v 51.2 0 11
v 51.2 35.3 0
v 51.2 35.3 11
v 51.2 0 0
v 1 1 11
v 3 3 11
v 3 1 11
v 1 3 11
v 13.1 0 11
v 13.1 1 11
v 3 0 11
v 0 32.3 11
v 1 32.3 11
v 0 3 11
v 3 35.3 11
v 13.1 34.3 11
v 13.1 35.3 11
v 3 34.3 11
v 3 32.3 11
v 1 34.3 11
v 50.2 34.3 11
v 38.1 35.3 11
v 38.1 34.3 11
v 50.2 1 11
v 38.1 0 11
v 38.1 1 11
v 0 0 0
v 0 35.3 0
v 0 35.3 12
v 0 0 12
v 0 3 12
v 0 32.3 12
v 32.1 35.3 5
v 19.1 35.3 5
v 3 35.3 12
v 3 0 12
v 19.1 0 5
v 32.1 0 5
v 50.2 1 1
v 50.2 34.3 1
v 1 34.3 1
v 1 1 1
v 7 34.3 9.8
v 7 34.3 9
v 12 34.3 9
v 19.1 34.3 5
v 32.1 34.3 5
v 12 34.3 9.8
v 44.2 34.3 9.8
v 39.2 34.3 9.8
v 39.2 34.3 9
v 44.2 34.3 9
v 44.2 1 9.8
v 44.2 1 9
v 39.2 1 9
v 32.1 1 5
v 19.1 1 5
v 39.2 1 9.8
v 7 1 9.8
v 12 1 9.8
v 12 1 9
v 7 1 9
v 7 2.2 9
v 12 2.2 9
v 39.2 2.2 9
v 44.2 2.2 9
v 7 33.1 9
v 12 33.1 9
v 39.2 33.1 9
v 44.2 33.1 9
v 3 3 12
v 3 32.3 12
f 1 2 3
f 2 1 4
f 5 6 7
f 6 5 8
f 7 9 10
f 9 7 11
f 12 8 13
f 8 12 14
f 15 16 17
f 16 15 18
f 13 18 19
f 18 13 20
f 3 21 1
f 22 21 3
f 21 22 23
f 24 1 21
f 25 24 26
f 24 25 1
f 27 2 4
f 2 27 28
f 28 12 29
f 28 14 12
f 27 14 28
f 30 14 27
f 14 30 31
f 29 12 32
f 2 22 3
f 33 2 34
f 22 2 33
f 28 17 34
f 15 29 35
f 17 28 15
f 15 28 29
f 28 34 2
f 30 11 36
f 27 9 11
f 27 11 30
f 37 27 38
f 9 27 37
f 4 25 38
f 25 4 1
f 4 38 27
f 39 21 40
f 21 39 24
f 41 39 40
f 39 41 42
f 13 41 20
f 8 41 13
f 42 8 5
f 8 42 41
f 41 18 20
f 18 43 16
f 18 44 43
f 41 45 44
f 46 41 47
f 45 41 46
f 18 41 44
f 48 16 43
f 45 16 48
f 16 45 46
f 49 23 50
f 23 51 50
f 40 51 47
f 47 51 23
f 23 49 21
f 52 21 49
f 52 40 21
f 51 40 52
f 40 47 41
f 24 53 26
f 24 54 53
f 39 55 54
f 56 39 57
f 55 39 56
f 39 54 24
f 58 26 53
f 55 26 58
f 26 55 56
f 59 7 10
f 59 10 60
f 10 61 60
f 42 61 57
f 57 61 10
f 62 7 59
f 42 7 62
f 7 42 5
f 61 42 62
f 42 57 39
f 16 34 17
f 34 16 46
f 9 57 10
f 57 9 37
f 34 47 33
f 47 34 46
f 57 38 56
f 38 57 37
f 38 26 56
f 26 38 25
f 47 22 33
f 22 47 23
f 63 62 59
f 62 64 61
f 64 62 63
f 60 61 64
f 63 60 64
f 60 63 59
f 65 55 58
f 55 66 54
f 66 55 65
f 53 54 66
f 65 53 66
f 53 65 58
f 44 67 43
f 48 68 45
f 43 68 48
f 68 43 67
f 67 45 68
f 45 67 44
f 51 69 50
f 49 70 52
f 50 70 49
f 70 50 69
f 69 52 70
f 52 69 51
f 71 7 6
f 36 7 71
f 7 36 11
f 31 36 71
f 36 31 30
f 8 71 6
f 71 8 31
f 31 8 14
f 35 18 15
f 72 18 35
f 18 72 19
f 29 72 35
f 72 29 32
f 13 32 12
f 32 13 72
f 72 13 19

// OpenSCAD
/*
 * Canon LP-E12 battery cover
 * 
 * Copyright (C) 2017  Matthias Gazzari
 * 
 * This program is free software: you can redistribute it and/or modify
 * it under the terms of the GNU General Public License as published by
 * the Free Software Foundation, either version 3 of the License, or
 * (at your option) any later version.
 * 
 * This program is distributed in the hope that it will be useful,
 * but WITHOUT ANY WARRANTY; without even the implied warranty of
 * MERCHANTABILITY or FITNESS FOR A PARTICULAR PURPOSE.  See the
 * GNU General Public License for more details.
 * 
 * You should have received a copy of the GNU General Public License
 * along with this program.  If not, see <https://www.gnu.org/licenses/>.
*/

// battery dimensions and tolerances in mm
battery_slit_h = 8;
tolerance = [0.8, 1, 0];
battery_size = [48.4, 32.3, 12.7] + tolerance;

// battery cover dimensions in mm
delta = 1;
h = 10;
hole_w = 25;
prism_w = 5;
prism_delta = 1.2;

cover(battery_size, battery_slit_h, h, delta, hole_w, prism_w, prism_delta);

module prism(l, s) {
	points = [[s/3, 0], [s, 0], [s, s]];
	translate([0, 0, s]) rotate([0, 90, 0])
	linear_extrude(l) polygon(points=points);
}

module hole(w, l, h) {
	points = [[-w/2, 1], [w/2, 1], [w/2, 0], [w/2 - h, -h], [-w/2 + h, -h], [-w/2, 0]];
	rotate([-90, 180, 0]) linear_extrude(l) polygon(points=points);
}

module cap(s, delta) {
	cube([delta + s, delta + s, delta]);
}

module cover(battery_size, battery_slit_h, h, delta, hole_w, prism_w, prism_delta) {
	// size of the basic battery cover
	cover_size = [battery_size.x + 2 * delta, battery_size.y + 2 * delta, h + delta];
	
	// translation values for the prisms
	x = [delta + 6, delta + battery_size.x - 6 - prism_w];
	y = [delta, delta + battery_size.y];
	z = battery_slit_h + delta;
	
	union() {
		// basic battery cover with a hole for pulling the battery out
		difference() {
			cube(cover_size);
			translate([1, 1, 1] * delta) cube(battery_size);
			translate([cover_size.x / 2, 0, cover_size.z]) hole(hole_w, cover_size.y, h * 0.6);
		}
		// prisms for holding the battery in place by snatching into the battery slits
		translate([x[0], y[0], z]) prism(prism_w, prism_delta);
		translate([x[1], y[0], z]) prism(prism_w, prism_delta);
		translate([x[0], y[1], z]) mirror([0, 1, 0]) prism(prism_w, prism_delta);
		translate([x[1], y[1], z]) mirror([0, 1, 0]) prism(prism_w, prism_delta);
		// caps for preventing the battery to fall out
		translate([0, 0, delta + h]) cap(2, delta);
		translate([0, battery_size.y - delta, delta + h]) cap(2, delta);
	}
}
